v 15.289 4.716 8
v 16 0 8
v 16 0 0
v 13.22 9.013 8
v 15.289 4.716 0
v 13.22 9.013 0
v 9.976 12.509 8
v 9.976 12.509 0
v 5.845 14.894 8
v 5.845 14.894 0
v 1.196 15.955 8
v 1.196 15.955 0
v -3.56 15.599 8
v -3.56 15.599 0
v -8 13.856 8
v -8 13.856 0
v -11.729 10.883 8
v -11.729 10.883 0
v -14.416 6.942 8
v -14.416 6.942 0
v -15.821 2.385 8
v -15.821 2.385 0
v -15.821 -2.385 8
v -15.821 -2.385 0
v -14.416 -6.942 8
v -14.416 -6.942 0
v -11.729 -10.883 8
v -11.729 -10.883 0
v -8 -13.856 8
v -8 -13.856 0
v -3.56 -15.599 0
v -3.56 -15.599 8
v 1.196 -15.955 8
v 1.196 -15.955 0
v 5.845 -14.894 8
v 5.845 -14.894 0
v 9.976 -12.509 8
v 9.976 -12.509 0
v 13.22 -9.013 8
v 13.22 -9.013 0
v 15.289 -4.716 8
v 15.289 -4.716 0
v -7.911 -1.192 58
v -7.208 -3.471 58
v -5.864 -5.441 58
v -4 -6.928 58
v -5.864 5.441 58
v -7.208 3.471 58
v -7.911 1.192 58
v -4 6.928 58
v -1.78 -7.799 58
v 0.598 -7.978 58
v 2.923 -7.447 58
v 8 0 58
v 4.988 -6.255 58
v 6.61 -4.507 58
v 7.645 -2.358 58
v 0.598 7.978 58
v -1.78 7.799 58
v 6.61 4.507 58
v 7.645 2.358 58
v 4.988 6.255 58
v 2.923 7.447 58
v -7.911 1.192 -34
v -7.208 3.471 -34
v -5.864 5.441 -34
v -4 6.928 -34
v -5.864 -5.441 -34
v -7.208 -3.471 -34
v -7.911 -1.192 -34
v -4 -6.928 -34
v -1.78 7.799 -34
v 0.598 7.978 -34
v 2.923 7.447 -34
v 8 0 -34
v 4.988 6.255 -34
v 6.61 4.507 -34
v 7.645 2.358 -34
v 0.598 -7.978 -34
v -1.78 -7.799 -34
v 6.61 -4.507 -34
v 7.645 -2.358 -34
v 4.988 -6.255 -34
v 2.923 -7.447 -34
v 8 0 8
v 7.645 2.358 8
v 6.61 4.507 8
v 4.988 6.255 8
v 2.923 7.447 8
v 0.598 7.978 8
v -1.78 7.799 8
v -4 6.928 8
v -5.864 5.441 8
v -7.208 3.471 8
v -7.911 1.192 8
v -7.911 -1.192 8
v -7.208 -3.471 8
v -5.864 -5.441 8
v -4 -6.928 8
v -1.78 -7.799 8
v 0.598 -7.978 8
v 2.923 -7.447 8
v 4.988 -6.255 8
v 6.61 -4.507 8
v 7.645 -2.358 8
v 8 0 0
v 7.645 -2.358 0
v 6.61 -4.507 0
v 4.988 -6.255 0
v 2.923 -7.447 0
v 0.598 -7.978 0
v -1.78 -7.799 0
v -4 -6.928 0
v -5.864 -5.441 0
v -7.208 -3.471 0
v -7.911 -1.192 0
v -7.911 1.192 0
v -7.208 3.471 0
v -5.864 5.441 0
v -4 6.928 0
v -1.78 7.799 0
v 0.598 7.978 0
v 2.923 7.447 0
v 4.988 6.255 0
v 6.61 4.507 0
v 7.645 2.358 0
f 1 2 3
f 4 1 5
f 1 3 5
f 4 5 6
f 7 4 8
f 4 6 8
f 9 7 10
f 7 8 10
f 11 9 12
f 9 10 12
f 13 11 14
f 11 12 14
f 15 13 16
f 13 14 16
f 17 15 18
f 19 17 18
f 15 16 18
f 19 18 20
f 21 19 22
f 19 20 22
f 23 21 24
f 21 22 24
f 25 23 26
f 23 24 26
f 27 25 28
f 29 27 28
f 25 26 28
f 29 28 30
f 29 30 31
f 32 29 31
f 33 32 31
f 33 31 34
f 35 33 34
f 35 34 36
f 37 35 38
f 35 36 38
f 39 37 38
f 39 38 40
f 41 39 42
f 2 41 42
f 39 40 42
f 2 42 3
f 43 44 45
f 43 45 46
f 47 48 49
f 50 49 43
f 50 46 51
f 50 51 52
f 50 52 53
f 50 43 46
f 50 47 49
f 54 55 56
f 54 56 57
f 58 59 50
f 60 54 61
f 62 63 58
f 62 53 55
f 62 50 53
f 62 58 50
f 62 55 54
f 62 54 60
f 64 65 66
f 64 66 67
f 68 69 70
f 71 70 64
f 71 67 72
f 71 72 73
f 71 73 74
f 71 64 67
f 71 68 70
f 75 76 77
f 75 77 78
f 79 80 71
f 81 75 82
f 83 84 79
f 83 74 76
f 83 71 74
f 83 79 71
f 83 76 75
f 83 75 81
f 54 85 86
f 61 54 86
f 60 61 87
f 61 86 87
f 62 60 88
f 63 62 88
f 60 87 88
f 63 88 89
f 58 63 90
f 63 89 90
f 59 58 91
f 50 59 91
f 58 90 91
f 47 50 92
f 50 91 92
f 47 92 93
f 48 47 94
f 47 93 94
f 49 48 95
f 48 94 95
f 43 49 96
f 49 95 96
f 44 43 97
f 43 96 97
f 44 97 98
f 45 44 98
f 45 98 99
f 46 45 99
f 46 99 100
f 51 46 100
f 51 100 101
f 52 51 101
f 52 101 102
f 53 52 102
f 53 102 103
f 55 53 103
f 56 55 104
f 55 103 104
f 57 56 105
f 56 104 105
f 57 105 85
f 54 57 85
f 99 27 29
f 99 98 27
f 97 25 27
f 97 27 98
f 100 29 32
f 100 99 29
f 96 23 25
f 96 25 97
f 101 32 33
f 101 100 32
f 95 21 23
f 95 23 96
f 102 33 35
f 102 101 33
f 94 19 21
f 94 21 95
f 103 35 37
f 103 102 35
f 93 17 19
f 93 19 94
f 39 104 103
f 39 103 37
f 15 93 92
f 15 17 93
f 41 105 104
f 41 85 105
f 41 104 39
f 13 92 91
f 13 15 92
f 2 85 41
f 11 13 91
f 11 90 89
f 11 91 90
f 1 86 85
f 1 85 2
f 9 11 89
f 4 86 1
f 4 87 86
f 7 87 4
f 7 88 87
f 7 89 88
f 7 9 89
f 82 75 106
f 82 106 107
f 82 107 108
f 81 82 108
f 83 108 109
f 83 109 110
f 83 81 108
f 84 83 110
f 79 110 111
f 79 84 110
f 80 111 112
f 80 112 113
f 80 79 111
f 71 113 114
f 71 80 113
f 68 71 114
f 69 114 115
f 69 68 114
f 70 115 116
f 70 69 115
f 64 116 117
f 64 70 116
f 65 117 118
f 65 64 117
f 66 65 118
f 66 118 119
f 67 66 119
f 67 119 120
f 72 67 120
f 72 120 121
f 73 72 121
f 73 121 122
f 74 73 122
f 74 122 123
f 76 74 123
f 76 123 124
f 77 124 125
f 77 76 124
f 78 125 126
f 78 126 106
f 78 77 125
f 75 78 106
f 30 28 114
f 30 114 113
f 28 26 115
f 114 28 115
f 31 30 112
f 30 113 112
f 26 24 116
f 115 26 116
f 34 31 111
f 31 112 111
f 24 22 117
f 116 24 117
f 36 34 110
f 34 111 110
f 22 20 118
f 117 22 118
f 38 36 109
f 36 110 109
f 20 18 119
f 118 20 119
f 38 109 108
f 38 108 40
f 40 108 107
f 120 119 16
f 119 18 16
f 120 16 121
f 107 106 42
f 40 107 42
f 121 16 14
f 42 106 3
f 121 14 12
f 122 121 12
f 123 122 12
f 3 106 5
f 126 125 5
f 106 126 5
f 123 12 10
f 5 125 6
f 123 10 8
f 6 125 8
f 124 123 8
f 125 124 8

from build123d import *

# Parameters (mm, degrees)
ESQUISSE1_R          = 16
BASE_EXTRUSION_DEPTH = 8
ESQUISSE2_R          = 8
BOSS_EXTRU_1_DEPTH   = 50
BOSS_EXTRU_2_START   = 34
ESQUISSE3_R          = 8
BOSS_EXTRU_2_DEPTH   = 34


with BuildPart() as part:
    # Esquisse1 → Base-Extrusion (new body)
    with BuildSketch(Plane.XY):
        Circle(ESQUISSE1_R)
    extrude(amount=BASE_EXTRUSION_DEPTH)

    # Esquisse2 → Boss.-Extru.1 (add)
    with BuildSketch(Plane.XY.offset(8)):
        Circle(ESQUISSE2_R)
    extrude(amount=BOSS_EXTRU_1_DEPTH)

    # Esquisse3 → Boss.-Extru.2 (add)
    with BuildSketch(Plane(origin=(0, 0, 0), x_dir=(-1, 0, 0), z_dir=(0, 0, -1)).offset(BOSS_EXTRU_2_START)):
        with Locations(Location((0, 0, 0), (0, 0, 180))):
            Circle(ESQUISSE3_R)
    extrude(amount=-BOSS_EXTRU_2_DEPTH)


solid = part.part
